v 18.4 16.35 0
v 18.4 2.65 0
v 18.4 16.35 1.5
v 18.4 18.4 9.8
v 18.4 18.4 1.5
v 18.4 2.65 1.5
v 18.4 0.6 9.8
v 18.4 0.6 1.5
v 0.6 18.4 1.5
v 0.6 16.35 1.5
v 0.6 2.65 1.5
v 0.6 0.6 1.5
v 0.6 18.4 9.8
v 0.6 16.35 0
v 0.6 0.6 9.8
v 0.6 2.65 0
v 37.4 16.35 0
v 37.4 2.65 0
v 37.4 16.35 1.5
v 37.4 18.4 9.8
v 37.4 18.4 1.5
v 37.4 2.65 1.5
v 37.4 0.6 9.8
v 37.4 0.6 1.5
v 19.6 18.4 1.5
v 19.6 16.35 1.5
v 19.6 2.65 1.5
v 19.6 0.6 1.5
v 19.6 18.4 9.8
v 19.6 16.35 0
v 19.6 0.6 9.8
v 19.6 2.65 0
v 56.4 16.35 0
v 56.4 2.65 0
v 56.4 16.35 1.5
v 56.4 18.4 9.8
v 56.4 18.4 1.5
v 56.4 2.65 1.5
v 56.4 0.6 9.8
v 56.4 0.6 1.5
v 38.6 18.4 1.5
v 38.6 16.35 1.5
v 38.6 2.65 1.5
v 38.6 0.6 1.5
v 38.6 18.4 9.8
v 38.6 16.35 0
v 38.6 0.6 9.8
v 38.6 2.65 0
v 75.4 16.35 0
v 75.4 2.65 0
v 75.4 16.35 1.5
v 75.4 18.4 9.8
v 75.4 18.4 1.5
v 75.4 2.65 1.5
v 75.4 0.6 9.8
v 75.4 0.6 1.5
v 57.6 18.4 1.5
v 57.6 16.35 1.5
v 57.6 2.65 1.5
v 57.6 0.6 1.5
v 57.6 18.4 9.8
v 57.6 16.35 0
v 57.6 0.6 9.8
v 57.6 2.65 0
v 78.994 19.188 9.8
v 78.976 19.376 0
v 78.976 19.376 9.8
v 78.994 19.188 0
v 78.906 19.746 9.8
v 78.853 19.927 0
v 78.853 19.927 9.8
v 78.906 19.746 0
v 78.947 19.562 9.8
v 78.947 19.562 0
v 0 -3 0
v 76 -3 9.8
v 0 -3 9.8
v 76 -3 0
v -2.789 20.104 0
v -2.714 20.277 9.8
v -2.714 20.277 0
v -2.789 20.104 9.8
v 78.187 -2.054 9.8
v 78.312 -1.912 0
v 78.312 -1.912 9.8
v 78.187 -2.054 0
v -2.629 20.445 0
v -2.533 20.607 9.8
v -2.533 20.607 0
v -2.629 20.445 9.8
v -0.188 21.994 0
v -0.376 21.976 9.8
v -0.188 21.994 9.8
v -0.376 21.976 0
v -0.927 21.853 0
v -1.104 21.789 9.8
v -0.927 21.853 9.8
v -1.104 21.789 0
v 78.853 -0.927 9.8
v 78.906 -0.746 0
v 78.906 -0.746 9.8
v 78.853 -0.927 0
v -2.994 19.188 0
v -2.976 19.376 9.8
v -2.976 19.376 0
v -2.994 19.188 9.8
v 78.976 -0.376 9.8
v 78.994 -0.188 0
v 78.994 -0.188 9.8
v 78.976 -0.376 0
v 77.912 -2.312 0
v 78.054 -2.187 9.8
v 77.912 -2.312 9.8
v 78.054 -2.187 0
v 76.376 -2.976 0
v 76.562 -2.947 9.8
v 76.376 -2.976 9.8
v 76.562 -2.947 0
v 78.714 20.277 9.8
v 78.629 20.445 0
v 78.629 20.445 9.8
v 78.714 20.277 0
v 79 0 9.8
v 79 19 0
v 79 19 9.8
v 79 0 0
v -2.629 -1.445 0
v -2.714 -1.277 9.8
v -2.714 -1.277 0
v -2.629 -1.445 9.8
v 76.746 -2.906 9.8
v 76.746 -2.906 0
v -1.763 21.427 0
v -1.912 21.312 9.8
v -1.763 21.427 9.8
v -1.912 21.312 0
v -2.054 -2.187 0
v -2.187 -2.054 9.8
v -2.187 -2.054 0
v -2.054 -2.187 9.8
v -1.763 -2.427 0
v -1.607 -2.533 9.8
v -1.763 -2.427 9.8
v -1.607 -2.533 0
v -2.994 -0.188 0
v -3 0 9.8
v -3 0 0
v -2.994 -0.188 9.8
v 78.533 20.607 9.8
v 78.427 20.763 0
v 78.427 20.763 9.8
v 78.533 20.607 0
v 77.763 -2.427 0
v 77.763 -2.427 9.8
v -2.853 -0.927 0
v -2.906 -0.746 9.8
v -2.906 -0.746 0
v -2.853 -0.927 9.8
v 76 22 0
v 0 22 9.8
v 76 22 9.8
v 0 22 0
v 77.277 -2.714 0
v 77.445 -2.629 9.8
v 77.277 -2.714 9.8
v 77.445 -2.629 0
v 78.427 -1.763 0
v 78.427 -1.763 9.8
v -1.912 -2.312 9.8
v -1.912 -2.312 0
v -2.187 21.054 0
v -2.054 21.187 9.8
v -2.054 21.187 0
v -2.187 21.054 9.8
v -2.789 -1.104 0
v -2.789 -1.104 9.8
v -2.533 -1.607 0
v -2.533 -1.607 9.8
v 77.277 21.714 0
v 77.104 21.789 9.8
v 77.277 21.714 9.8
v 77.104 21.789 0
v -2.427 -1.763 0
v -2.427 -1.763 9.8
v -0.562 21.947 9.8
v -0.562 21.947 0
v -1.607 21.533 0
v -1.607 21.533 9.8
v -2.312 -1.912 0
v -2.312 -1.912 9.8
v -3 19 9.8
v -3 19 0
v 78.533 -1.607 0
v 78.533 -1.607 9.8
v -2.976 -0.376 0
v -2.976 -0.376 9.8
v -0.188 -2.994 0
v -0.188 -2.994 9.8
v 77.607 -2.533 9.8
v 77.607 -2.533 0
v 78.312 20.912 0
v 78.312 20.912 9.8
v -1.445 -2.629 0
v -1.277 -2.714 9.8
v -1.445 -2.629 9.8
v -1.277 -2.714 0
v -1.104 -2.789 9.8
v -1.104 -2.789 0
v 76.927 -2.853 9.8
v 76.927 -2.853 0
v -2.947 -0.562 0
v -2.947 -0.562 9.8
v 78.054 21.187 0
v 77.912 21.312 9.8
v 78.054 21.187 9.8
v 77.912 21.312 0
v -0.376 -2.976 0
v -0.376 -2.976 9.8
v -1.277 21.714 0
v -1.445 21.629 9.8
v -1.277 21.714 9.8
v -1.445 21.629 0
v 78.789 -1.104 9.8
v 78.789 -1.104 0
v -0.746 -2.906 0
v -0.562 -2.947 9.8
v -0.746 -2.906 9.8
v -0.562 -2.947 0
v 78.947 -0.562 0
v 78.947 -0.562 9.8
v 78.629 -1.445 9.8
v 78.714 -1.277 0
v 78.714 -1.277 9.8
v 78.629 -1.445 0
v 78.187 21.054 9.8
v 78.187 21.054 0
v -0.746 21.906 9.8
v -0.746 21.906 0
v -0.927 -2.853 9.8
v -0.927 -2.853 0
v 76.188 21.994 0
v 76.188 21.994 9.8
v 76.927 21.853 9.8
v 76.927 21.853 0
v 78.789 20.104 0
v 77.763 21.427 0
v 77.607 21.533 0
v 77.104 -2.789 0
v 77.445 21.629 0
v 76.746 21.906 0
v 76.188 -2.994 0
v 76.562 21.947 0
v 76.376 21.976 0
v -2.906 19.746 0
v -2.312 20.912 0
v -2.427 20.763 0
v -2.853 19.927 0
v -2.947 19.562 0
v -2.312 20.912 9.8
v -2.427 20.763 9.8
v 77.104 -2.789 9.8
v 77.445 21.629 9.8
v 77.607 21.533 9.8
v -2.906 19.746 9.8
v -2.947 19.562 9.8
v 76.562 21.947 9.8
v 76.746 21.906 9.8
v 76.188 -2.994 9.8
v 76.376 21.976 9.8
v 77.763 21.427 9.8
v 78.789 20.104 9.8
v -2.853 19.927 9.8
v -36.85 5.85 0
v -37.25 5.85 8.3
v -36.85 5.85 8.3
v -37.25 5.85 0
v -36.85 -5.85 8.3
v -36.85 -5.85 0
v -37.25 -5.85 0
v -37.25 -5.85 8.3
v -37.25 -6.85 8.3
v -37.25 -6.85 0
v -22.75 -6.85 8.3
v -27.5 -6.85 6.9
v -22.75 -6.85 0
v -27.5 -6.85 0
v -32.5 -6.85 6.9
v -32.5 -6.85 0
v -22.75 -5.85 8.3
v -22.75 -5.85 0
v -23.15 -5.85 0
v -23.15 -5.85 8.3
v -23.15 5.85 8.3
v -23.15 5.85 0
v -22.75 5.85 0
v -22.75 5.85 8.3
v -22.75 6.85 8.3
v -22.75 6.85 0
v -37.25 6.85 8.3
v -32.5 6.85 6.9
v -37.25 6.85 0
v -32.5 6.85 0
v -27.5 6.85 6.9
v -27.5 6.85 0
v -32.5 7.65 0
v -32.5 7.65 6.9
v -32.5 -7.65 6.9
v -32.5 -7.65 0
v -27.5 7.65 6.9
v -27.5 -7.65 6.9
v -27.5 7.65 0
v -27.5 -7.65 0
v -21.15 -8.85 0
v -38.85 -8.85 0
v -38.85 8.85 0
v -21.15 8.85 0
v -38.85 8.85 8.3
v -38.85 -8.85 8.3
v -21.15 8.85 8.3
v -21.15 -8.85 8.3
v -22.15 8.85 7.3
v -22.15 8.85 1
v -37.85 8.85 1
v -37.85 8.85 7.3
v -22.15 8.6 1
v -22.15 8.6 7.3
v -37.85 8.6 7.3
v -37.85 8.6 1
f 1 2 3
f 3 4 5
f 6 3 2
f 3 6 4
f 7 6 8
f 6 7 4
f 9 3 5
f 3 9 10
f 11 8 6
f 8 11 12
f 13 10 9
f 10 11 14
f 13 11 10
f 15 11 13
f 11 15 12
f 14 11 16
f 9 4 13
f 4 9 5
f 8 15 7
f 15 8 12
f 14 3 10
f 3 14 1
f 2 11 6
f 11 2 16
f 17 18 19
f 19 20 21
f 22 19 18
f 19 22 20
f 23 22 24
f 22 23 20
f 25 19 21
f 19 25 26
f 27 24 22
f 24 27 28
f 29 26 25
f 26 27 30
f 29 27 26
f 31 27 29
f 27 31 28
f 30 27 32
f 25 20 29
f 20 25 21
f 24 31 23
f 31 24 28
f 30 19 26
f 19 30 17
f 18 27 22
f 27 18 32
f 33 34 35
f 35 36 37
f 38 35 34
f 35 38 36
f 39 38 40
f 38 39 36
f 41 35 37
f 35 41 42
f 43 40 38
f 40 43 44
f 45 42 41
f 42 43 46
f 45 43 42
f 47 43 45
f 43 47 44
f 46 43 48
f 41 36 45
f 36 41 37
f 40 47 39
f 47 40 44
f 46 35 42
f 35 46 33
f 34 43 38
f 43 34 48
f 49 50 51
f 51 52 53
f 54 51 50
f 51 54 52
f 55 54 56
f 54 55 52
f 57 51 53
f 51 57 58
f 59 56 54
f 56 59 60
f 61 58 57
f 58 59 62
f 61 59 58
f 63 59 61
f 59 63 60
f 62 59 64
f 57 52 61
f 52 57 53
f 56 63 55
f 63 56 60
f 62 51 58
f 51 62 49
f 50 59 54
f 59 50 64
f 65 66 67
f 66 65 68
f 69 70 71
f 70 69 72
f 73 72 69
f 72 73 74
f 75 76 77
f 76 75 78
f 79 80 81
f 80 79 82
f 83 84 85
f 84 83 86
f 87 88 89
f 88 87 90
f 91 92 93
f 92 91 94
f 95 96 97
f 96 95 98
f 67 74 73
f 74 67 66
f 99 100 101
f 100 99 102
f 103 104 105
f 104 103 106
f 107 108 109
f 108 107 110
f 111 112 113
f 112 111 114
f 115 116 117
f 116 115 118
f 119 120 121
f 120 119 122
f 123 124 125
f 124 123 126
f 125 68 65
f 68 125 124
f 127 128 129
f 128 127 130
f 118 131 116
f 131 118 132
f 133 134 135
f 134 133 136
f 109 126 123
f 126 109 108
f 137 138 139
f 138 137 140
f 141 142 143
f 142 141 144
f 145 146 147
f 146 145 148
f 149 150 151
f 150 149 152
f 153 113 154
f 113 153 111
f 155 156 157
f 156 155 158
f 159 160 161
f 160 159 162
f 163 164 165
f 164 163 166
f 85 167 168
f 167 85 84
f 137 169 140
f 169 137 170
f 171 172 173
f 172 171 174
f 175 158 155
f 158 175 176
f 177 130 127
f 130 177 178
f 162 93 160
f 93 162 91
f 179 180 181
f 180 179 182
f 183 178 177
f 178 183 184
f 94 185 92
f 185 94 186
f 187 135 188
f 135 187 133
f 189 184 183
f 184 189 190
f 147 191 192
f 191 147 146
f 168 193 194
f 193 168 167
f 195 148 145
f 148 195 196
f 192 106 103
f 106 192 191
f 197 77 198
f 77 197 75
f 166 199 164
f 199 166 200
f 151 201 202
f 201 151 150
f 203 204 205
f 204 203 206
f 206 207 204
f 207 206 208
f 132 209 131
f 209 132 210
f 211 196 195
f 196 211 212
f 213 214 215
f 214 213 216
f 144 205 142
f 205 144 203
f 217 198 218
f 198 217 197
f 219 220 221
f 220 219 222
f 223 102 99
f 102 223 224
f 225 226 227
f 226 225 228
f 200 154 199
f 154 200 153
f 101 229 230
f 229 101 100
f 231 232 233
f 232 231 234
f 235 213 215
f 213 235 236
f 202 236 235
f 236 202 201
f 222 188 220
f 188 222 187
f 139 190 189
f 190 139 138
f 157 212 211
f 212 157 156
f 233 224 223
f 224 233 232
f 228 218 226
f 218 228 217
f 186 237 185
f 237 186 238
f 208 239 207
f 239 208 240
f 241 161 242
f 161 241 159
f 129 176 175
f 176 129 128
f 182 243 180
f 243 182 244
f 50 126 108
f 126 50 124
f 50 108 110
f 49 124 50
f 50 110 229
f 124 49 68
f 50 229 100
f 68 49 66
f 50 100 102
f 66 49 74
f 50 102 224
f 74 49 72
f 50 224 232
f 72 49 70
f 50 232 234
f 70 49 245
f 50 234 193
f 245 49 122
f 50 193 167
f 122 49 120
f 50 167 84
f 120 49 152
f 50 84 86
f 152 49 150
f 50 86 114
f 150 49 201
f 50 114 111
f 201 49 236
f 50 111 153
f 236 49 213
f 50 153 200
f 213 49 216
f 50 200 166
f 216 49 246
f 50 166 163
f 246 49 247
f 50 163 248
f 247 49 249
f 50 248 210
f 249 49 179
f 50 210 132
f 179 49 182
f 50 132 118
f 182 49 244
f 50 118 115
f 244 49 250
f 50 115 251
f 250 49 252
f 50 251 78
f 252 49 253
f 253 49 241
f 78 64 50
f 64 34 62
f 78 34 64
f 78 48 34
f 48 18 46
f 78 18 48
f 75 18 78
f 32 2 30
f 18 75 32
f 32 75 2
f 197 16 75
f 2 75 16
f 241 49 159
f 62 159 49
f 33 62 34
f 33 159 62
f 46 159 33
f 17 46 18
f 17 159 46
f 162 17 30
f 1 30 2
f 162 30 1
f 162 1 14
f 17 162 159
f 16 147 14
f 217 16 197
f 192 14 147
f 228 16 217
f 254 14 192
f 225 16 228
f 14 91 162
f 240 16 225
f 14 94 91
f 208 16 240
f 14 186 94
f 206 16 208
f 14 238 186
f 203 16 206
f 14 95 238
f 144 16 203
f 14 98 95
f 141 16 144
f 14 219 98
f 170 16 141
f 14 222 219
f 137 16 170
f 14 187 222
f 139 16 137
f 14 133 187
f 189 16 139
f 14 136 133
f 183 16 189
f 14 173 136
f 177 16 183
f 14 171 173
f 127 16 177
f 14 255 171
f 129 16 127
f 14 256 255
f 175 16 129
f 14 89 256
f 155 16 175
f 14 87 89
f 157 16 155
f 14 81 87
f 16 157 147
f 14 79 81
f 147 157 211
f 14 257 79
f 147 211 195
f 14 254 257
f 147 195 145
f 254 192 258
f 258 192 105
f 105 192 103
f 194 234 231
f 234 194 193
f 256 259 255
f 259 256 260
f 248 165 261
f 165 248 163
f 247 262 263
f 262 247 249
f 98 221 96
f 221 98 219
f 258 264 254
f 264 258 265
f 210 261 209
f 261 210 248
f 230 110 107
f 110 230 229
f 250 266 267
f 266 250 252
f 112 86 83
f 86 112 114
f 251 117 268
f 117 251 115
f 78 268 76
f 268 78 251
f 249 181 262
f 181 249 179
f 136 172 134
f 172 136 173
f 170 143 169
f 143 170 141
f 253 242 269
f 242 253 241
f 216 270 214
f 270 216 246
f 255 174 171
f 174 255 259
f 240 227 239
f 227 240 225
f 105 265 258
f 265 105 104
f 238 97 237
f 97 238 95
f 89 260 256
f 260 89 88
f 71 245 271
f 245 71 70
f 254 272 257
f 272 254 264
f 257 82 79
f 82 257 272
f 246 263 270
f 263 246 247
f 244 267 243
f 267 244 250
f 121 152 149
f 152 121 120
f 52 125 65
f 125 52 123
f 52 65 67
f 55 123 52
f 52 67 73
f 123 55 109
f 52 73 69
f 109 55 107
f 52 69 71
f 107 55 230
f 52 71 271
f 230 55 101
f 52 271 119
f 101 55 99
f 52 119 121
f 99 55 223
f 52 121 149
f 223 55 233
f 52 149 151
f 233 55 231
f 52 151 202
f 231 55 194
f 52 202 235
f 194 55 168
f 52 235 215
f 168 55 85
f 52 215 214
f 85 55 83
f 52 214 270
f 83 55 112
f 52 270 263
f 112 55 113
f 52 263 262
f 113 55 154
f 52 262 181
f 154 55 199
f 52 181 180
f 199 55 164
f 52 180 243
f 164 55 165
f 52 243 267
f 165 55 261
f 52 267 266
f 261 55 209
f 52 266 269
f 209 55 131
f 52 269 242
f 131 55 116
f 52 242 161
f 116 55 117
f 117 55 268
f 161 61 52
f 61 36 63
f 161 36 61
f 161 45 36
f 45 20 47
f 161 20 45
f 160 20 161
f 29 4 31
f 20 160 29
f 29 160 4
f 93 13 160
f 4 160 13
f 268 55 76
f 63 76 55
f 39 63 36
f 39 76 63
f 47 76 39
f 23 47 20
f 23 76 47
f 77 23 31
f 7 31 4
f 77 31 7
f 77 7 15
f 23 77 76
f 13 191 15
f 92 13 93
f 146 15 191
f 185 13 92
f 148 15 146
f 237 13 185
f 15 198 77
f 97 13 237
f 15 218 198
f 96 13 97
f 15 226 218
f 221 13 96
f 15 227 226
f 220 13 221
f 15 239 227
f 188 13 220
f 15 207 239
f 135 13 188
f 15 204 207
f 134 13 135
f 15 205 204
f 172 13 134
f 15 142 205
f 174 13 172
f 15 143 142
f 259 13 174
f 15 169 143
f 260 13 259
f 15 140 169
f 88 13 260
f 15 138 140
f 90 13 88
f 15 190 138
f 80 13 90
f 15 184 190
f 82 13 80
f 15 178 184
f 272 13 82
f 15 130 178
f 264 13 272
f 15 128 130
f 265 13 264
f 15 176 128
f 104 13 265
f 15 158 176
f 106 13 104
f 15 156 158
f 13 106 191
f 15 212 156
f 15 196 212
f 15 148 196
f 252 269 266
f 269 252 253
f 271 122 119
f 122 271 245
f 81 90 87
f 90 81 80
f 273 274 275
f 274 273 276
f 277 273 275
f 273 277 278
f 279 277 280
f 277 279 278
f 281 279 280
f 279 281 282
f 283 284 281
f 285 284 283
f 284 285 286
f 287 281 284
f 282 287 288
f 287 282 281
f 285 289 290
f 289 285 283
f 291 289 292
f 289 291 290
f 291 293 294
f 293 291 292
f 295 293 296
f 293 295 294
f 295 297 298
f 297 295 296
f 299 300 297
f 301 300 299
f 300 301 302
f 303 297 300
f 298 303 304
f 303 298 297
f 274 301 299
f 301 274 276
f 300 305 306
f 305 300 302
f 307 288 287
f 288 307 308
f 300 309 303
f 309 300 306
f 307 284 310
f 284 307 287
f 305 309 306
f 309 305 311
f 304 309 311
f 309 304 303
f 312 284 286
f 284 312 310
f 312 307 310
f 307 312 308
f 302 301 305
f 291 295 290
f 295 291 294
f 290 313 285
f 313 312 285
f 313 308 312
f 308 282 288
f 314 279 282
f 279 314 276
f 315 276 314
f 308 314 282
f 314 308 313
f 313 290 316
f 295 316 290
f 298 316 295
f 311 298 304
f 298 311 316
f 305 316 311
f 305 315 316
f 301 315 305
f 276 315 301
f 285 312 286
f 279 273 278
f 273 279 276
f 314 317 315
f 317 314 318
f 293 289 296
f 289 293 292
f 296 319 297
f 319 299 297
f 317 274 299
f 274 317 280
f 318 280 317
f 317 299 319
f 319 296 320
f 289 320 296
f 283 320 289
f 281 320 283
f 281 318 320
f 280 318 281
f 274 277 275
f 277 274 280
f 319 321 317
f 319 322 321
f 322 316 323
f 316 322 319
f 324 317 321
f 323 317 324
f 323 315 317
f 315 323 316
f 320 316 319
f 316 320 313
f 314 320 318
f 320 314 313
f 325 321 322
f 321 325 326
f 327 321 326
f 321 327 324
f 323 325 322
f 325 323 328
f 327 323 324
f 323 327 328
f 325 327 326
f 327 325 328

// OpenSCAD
// OpenSCAD settings
subtract_overlap = 1;
$fn = 100;

// Printer settings
extrusion_width = 0.4;
fit_compensation = 0.1;

// Switch dimensions
switch_depth = 13.7; // north-south
switch_width = switch_depth; // east-west (some switches are narrower here)
// total height of the lower half of the switch from the top of the plate to the lowest point of the
// lowest point of the switch
switch_height = 8.3;
unit = 19;

// Click ledge dimensions
ledge_width = 5;
ledge_depth = 0.8;
// this is the hight of the plate for plates that are a simple cutout
ledge_height = 1.4;

// Edge overshoot dimensions
edge_overshoot_depth = 0.4;
edge_overshoot_width = 1;

// Module dimensions
module_height = switch_height;
rack_wall_thickness = 3*extrusion_width;
module_hole_width = unit-rack_wall_thickness;
module_width = module_hole_width-fit_compensation;

// label recess dimensions
label_recess_depth = 0.25;
label_recess_border = 1;

// switch_plate dimensions
plate_rows = 1;
plate_columns = 4;
plate_bottom_thickness = 1.5;
plate_border_thickness = 3;

module copy_mirror(vec=[0,1,0])
{
    children();
    mirror(vec) children();
}

module switch_cutout() {
    translate([0, 0, -1*subtract_overlap]){
        linear_extrude(module_height+2*subtract_overlap) {
            square([switch_width, switch_depth], center=true);
            copy_mirror()
            translate([0, switch_depth/2-edge_overshoot_width/2, 0])
            square([switch_width+2*edge_overshoot_depth, edge_overshoot_width], center=true);
        };
        linear_extrude(module_height+subtract_overlap-ledge_height)
        square([ledge_width,switch_depth+2*ledge_depth], center=true);
    }
}

module label_recess() {
    translate([
        -1*module_width/2+label_recess_border,
        module_width/2-label_recess_depth,
        label_recess_border
    ])
    cube([
        module_width-2*label_recess_border,
        label_recess_depth+subtract_overlap,
        module_height-2*label_recess_border
    ]);
}

module switch_module() {
    difference() {
        linear_extrude(module_height)
        square(module_width, center=true);
        #switch_cutout();
        #label_recess();
    }
}

module plate_hole() {
    translate([rack_wall_thickness/2, rack_wall_thickness/2, 0]) {
        translate([0, 0, plate_bottom_thickness])
        cube([module_hole_width, module_hole_width, module_height+subtract_overlap]);
        translate([0, (module_hole_width-switch_depth)/2, -1*subtract_overlap])
        cube([module_hole_width, switch_depth, plate_bottom_thickness+2*subtract_overlap]);
    }
}

module switch_plate() {
    difference() {
        linear_extrude(plate_bottom_thickness+module_height)
        minkowski() {
            square([unit*plate_columns, unit*plate_rows]);
            circle(plate_border_thickness);
        };
        for(i = [0:plate_columns-1], j = [0:plate_rows-1])
        translate([i*unit, j*unit, 0])
        plate_hole();
    }
}


switch_plate();
translate([-30,0,0])switch_module();
